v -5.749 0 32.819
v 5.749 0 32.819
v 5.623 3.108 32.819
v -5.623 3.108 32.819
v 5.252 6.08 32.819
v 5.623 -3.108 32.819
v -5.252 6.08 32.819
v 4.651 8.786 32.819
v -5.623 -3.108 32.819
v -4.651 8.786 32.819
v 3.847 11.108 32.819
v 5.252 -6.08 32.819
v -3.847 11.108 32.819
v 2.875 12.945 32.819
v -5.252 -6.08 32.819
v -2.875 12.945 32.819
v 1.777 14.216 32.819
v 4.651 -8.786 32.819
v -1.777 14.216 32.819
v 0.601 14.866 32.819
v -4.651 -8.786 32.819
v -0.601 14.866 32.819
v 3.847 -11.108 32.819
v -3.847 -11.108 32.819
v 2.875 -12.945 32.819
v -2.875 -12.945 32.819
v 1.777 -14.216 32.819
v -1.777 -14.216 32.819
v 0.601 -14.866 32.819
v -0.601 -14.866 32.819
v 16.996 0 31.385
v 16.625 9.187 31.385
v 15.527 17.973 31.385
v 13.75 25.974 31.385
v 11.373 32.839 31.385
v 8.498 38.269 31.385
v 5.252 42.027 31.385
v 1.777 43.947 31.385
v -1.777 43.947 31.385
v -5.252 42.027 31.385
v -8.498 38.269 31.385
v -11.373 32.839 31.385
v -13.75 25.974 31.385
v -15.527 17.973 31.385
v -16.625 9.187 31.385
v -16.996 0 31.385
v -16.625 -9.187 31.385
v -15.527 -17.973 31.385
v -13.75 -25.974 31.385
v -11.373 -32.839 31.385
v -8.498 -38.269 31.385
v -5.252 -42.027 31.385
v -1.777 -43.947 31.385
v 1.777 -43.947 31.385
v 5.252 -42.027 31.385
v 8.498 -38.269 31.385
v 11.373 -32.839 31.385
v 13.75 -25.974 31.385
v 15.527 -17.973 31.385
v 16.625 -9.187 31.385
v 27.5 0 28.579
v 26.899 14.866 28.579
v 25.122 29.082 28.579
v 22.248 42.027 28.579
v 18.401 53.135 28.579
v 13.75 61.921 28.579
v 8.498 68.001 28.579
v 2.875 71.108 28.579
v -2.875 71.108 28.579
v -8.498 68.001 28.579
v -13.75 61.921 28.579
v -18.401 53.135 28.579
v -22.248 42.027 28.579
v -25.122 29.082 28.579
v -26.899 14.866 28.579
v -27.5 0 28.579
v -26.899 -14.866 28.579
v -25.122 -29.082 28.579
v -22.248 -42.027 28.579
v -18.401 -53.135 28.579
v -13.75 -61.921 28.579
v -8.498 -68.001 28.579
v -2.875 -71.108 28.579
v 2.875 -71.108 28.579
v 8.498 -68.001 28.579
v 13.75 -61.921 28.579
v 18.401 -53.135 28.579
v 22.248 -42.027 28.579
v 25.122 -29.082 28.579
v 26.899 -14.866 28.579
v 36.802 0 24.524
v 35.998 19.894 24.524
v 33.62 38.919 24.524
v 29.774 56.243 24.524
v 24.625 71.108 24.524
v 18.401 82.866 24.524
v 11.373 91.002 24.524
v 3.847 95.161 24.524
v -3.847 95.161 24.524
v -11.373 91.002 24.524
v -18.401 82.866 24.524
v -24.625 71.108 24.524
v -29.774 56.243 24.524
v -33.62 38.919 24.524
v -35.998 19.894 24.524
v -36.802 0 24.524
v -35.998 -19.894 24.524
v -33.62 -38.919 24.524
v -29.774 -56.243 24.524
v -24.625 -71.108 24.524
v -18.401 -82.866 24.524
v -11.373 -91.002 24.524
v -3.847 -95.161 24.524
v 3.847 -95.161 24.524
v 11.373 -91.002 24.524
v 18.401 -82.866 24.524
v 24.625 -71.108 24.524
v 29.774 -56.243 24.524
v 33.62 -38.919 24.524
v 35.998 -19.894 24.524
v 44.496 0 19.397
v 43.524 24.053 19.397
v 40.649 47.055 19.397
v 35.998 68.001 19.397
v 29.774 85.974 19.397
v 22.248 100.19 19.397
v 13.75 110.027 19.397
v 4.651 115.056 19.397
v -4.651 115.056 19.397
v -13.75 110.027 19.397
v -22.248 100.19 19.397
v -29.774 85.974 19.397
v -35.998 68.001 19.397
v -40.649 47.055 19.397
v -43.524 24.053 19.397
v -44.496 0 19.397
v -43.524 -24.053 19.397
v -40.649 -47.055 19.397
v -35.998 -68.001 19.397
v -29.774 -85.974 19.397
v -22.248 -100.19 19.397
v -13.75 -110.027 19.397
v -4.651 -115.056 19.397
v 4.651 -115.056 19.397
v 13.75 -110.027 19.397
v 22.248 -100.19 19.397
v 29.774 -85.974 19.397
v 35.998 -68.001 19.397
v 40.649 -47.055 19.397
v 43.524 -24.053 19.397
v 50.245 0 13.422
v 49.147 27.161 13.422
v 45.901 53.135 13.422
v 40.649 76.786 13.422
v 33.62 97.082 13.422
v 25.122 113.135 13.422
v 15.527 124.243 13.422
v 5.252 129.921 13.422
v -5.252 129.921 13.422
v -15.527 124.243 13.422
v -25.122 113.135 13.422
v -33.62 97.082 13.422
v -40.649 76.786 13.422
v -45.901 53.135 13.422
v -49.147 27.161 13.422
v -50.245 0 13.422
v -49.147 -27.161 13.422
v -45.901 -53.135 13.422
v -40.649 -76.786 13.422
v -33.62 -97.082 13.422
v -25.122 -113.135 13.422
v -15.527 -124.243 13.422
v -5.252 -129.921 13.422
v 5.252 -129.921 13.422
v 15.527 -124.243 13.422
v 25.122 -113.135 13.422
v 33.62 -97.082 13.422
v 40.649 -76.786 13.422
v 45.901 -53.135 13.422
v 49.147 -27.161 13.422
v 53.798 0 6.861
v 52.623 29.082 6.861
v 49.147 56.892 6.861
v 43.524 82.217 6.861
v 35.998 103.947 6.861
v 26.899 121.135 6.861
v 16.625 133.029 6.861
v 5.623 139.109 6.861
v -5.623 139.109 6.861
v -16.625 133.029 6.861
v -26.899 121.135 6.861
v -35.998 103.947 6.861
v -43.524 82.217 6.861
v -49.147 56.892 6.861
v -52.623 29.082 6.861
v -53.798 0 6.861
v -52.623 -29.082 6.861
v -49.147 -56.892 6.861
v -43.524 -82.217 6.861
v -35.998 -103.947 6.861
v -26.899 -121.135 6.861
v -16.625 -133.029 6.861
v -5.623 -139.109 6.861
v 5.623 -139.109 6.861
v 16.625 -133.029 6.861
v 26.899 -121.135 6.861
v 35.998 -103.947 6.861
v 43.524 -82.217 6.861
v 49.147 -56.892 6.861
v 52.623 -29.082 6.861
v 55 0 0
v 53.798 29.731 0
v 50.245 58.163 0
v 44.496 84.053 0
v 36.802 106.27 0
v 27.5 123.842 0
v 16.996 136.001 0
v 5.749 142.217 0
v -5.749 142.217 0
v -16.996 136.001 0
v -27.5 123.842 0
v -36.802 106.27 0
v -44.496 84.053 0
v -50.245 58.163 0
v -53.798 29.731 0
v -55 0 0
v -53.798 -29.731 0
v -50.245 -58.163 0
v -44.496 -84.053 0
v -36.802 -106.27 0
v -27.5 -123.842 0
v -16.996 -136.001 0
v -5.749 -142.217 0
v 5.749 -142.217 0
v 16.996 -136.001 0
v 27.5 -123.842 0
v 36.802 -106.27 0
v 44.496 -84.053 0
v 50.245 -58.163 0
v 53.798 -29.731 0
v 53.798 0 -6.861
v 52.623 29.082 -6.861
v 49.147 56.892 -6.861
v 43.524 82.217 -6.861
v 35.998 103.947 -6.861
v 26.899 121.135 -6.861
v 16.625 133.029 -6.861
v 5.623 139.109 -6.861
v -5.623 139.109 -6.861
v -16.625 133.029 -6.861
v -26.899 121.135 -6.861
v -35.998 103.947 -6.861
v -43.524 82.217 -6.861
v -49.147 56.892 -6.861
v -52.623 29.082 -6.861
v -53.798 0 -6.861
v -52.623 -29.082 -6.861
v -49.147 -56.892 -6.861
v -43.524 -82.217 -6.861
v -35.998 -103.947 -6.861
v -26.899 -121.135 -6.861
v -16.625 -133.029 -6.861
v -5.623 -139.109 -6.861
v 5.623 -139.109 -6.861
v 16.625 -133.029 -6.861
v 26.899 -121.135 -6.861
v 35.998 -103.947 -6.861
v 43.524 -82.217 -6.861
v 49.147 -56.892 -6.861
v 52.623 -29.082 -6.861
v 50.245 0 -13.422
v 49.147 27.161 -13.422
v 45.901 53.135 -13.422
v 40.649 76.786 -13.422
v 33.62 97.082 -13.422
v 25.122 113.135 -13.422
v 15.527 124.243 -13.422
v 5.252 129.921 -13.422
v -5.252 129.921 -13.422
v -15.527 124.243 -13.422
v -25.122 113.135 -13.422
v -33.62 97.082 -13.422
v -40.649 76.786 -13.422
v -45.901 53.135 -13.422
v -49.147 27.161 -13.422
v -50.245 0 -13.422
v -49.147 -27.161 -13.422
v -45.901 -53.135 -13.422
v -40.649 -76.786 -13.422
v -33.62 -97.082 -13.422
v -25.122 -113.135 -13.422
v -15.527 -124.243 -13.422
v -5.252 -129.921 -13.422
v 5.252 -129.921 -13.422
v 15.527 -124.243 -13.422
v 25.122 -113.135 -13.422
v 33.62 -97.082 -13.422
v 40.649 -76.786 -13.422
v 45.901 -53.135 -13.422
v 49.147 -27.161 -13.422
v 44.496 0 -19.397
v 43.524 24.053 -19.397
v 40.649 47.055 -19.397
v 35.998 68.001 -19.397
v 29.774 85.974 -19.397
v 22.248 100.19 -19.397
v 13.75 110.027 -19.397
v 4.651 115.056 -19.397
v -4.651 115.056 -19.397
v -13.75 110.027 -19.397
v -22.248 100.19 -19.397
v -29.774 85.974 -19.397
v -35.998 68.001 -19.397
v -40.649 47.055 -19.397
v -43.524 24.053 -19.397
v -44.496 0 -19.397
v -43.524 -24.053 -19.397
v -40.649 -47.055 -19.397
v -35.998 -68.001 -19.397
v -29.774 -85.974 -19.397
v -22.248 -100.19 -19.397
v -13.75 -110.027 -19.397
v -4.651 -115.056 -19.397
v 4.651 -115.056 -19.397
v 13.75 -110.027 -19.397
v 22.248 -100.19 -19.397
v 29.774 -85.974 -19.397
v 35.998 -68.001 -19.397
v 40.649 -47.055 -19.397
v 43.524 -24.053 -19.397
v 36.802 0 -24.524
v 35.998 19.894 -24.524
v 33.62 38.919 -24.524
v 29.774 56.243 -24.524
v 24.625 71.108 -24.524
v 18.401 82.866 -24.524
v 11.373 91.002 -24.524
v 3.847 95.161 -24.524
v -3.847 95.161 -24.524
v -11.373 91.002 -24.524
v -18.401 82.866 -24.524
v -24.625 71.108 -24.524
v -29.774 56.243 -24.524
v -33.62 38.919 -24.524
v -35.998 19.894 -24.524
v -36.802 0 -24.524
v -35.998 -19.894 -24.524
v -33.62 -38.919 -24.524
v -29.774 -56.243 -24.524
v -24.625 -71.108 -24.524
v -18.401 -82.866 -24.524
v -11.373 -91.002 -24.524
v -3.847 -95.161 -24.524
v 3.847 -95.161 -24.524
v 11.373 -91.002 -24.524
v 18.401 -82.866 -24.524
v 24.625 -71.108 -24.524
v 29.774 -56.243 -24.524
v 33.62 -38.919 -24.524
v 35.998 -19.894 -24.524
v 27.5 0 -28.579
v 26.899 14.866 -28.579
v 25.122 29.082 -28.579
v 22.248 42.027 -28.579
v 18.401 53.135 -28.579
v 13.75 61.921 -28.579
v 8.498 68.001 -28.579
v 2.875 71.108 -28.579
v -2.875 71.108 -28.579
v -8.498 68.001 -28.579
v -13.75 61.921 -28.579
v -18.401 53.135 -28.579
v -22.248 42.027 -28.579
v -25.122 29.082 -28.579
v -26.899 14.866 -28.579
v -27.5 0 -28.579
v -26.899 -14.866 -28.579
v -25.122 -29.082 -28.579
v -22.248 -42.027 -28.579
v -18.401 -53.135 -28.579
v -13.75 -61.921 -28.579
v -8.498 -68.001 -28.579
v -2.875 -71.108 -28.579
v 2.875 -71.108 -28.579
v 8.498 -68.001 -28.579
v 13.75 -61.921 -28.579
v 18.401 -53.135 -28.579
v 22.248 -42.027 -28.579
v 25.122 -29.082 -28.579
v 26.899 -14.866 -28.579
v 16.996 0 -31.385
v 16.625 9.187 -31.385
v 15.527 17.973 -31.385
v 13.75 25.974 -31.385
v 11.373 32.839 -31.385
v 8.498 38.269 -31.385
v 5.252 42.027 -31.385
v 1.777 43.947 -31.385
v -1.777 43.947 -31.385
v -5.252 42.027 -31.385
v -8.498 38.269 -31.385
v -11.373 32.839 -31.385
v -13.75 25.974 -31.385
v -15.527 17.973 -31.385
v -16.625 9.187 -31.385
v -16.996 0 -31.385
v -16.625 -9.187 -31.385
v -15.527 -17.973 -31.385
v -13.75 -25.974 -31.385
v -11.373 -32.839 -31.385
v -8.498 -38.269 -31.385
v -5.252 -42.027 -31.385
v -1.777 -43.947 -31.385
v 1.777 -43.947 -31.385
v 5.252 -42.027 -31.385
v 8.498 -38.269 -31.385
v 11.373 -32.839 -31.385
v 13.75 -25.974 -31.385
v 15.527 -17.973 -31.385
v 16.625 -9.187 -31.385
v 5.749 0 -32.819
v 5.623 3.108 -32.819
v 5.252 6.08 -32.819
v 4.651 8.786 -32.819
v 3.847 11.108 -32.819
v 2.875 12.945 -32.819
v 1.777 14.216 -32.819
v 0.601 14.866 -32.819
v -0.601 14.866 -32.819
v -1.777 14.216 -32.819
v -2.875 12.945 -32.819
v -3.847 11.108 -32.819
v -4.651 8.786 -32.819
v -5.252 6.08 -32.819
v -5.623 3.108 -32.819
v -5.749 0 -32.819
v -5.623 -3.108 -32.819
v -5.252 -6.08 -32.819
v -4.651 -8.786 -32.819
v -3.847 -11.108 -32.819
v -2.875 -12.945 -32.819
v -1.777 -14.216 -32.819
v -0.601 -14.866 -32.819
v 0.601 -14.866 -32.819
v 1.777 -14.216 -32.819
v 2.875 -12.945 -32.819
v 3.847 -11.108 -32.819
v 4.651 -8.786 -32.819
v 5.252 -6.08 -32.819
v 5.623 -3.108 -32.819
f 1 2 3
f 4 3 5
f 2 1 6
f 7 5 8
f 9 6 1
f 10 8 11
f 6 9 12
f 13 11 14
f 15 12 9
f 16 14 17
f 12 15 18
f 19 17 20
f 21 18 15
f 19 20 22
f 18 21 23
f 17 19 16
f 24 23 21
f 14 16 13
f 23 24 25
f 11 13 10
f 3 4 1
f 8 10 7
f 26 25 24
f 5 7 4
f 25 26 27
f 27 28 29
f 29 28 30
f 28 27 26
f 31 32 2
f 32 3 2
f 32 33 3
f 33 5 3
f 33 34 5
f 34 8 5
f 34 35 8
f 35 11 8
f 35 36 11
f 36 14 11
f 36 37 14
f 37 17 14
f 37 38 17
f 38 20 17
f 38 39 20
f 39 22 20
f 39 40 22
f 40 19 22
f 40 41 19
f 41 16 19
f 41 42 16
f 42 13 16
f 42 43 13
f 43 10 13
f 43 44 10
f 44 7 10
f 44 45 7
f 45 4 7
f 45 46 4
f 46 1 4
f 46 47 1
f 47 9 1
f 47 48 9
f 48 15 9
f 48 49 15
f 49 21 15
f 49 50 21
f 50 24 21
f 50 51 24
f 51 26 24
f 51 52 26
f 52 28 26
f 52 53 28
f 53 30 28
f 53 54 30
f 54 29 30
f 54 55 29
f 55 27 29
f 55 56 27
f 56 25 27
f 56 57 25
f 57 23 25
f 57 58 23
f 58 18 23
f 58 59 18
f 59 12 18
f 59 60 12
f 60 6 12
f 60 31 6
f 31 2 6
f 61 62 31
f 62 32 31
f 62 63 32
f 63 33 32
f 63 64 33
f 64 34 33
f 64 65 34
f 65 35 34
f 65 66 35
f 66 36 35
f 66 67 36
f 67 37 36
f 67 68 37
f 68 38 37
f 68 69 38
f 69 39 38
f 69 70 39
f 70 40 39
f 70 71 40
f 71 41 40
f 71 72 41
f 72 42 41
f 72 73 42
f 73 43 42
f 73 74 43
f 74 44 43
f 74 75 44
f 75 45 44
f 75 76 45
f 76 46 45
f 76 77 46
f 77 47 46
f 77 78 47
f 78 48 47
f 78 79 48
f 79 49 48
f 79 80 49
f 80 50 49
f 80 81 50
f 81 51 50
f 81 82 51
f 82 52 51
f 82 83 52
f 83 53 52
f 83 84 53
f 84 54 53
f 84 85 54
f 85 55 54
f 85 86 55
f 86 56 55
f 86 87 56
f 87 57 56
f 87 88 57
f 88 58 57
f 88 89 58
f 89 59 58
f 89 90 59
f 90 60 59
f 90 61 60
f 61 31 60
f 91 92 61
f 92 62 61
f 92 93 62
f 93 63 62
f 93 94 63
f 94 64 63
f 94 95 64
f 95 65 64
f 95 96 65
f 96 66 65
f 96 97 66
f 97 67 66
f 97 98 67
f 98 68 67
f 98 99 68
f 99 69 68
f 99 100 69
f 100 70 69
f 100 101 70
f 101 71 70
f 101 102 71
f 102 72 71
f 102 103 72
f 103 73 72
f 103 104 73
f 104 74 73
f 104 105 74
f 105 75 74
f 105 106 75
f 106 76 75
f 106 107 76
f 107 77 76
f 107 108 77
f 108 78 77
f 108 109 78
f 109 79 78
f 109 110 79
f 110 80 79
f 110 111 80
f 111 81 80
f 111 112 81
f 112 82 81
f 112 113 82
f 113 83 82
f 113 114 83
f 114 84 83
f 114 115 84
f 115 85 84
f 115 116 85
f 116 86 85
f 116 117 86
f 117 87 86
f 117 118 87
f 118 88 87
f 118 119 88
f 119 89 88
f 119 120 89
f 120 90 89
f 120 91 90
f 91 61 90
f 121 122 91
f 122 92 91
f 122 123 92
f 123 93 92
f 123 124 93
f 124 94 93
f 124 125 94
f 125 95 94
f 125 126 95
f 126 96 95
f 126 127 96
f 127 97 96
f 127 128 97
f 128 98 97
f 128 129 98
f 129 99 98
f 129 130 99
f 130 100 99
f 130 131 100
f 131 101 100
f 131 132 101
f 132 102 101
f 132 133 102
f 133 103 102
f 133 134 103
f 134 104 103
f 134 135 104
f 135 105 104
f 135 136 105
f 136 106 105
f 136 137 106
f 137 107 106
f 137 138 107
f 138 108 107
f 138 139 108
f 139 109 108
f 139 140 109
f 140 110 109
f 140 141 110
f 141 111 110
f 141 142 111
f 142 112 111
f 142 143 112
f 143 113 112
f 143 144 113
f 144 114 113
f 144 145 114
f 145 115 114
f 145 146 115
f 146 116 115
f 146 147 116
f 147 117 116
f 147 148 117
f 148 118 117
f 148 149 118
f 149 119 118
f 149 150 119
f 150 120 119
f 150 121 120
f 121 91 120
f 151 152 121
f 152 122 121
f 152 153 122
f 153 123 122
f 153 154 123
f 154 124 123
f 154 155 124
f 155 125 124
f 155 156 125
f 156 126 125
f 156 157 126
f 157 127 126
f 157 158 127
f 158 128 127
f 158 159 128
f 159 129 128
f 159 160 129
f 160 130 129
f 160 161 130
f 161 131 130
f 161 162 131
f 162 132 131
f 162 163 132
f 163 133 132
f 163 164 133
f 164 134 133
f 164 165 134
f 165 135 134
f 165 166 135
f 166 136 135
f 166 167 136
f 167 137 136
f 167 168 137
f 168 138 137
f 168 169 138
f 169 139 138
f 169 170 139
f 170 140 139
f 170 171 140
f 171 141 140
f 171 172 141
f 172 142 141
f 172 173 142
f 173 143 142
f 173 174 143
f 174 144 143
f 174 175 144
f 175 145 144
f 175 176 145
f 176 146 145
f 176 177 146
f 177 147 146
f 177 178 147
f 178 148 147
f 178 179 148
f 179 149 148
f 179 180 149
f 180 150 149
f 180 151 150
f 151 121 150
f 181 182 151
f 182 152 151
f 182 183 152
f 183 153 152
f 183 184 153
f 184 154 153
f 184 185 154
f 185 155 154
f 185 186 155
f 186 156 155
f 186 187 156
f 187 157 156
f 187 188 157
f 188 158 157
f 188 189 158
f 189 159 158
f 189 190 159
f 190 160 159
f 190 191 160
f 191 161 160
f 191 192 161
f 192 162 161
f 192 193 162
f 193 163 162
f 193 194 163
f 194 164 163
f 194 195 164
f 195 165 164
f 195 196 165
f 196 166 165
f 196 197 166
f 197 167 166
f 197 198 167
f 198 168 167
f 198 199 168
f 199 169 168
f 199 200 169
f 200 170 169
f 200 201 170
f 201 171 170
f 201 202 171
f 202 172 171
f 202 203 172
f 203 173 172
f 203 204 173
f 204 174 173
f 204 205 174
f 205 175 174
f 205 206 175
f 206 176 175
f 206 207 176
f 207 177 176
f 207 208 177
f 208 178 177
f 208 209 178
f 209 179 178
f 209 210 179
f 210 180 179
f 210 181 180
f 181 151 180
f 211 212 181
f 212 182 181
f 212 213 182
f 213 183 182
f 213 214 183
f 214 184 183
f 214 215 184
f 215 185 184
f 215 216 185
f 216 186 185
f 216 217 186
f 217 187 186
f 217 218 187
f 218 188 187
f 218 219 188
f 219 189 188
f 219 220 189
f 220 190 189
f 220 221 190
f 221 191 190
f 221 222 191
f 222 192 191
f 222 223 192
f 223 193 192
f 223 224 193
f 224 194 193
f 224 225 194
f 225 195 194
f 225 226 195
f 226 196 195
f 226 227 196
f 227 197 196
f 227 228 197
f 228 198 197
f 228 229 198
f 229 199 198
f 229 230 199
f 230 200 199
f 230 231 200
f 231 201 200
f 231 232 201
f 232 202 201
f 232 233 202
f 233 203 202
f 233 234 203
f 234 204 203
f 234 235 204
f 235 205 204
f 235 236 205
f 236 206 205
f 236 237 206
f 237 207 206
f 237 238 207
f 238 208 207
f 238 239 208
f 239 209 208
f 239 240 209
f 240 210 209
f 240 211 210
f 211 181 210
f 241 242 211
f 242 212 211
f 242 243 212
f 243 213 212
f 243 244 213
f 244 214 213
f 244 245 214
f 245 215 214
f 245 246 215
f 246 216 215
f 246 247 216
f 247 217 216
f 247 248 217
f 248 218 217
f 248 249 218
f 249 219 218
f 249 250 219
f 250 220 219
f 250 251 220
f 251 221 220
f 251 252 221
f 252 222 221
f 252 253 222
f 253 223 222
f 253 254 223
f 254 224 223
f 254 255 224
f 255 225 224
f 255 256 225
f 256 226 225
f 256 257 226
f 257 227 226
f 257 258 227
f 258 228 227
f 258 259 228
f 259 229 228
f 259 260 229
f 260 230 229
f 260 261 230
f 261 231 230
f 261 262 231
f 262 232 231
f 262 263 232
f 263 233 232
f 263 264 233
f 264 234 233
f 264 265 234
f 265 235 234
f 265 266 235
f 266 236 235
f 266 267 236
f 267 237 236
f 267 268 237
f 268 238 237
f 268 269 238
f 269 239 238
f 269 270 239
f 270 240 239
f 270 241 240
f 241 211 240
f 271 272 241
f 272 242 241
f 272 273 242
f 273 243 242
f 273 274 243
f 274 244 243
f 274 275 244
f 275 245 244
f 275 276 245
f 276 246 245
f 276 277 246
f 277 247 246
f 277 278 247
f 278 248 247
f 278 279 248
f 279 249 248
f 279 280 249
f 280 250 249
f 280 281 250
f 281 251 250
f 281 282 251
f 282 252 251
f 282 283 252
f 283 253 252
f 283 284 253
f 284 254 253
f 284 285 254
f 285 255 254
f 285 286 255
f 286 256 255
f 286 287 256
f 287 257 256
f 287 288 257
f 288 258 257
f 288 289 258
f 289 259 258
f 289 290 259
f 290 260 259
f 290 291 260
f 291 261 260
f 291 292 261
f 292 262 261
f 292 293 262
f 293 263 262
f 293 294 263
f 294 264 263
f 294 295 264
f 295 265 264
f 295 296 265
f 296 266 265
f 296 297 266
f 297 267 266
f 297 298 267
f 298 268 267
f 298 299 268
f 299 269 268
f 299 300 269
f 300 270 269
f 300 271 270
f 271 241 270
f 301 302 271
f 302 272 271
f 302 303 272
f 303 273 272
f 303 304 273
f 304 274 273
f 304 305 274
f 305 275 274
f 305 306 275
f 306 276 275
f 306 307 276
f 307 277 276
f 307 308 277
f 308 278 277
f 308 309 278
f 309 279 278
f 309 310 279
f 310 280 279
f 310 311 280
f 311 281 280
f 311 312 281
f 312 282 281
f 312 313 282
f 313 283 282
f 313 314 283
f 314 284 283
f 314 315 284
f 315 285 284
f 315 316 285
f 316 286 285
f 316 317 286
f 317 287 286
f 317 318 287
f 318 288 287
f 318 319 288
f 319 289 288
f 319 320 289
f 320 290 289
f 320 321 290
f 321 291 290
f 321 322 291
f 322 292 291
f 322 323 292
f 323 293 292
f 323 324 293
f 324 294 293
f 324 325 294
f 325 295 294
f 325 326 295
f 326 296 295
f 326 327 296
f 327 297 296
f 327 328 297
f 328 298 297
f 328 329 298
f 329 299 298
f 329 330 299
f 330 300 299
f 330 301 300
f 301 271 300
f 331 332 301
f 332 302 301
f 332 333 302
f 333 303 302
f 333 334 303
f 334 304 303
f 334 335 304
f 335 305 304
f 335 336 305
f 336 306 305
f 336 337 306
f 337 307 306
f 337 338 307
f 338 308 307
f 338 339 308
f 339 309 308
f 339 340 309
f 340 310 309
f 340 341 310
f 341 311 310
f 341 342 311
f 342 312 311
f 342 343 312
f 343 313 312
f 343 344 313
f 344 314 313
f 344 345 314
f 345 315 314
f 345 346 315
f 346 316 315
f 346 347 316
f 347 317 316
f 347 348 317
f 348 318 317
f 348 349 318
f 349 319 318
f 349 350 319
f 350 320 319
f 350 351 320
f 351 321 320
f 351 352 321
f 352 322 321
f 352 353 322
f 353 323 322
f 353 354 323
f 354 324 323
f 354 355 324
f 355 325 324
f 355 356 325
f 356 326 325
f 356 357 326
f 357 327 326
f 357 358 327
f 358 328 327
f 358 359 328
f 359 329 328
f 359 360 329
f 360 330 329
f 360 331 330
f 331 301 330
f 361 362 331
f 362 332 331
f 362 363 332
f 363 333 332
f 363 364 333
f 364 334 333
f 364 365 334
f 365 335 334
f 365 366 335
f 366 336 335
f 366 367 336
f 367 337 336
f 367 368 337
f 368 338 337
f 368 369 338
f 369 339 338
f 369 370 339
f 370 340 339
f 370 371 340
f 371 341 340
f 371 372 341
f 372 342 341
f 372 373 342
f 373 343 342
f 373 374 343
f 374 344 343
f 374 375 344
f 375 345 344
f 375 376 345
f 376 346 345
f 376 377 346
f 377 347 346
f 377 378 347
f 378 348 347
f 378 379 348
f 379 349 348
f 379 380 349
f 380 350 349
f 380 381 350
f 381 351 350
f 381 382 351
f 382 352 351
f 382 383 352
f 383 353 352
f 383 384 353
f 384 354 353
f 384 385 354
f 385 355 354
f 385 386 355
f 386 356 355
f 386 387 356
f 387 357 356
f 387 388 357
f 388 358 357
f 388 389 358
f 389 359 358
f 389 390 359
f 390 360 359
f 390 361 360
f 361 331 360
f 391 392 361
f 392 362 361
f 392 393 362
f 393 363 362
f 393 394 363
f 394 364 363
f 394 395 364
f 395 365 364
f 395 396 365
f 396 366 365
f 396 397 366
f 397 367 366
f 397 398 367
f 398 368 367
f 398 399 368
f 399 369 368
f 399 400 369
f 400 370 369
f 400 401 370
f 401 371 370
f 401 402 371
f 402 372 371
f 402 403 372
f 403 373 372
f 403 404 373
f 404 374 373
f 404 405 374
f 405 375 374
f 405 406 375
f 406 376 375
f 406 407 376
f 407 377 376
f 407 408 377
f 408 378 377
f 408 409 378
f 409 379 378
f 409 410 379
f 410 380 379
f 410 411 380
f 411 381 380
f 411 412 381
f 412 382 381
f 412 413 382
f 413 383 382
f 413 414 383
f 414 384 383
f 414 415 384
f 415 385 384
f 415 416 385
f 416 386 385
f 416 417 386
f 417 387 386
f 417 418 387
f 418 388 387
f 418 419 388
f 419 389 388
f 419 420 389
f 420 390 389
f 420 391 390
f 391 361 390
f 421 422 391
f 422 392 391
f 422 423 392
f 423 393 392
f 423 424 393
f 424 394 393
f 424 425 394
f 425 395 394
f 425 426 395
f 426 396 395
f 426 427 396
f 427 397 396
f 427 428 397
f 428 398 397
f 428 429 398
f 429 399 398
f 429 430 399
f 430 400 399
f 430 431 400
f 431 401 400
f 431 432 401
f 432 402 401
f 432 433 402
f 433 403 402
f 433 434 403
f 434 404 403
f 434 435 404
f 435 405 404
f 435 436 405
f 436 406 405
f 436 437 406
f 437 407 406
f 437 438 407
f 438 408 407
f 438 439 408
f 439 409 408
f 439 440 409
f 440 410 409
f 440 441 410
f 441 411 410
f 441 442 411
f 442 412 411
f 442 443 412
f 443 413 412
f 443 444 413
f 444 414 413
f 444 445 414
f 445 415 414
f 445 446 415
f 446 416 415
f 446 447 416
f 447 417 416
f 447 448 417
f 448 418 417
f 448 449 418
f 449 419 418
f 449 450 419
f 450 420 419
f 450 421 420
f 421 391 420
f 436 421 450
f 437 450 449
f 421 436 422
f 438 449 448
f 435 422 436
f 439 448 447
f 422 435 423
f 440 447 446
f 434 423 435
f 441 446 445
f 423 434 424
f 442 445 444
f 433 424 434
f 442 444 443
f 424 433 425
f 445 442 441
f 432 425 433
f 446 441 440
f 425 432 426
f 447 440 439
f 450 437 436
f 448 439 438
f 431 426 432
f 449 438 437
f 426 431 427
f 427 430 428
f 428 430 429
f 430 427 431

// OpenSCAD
// Generated by SolidPython 1.0.1 on 2020-07-29 00:46:46


scale(v = [5, 13, 3]) {
	sphere(r = 11);
}
/***********************************************
*********      SolidPython code:      **********
************************************************
 
# import packages: SolidPython
from solid import *
from solid.utils import *
from itertools import chain, combinations, permutations


class Resize:

    def __init__(self, scad_file):
        self.scad_file = scad_file
        #self.scad_file = import_scad(scad_file)
        # cone/cylinder param:
        self.r1 = 0
        self.r2 = 0
        self.h = 0
        # rectangular prism param:
        self.w = 0
        self.l = 0
        # ellipse param:
        self.r = 0

    # import OpenScad code (file name corresponds to shape)


    # classify shape + parameters
    def assign(self, param1, param2, param3):
        if self.scad_file == 'cone.scad':
            self.r1 = param1
            self.r2 = param2
            self.h = param3
        elif self.scad_file == 'cylinder.scad':
            self.r1 = param1
            self.r2 = param2
            self.h = param3
        elif self.scad_file == 'rectangularPrism.scad':
            self.h = param1
            self.l = param2
            self.w = param3
        else:
            self.r = param1
            self.h = param2

    # resize parameters
    def iterate(self):
        x = range(3, 20, 2)
        i = 1
        if self.scad_file == 'cone.scad':
            tempList = list(permutations(x, 2))
            for temp in tempList:
                param1 = temp[0]
                param2 = temp[1]
                filepath = 'produced_scad_files/' + 'cone' + str(param1) + '_' + str(param2) + '_' + '.scad'
                scad_render_to_file(cylinder(h=param1, r1=param2, r2=0), filepath)

        elif self.scad_file == 'cylinder.scad':
            tempList = list(permutations(x, 3))
            for temp in tempList:
                param1 = temp[0]
                param2 = temp[1]
                filepath = 'produced_scad_files/' + 'cylinder' + str(param1) + '_' + str(param2) + '_' + '.scad'
                scad_render_to_file(cylinder(h=param1, r1=param2, r2=param2), filepath)

        elif self.scad_file == 'rectangularPrism.scad':
            tempList = list(permutations(x, 3))
            for temp in tempList:
                param1 = temp[0]
                param2 = temp[1]
                param3 = temp[2]
                filepath = 'produced_scad_files/' + 'rectangularPrism' + str(param1) + '_' + str(param2) + '_' + str(
                    param3) + '.scad'
                scad_render_to_file(cube(size=(param1, param2, param3)), filepath)

        elif self.scad_file == 'ellipse.scad':
            tempList = list(permutations(x, 4))
            for temp in tempList:
                param1 = temp[0]
                param2 = temp[1]
                param3 = temp[2]
                param4 = temp[3]
                filepath = 'produced_scad_files/' + 'ellipse' + str(param1) + '_' + str(param2) + '_' + str(param3) + '_' + str(param4) + '.scad'
                scad_render_to_file(scale([param1, param2, param3])(sphere(r=param4)), filepath)

    def render_to_scadfile(self):
        scad_render_to_file(scad, 'example.scad') 
 
************************************************/
